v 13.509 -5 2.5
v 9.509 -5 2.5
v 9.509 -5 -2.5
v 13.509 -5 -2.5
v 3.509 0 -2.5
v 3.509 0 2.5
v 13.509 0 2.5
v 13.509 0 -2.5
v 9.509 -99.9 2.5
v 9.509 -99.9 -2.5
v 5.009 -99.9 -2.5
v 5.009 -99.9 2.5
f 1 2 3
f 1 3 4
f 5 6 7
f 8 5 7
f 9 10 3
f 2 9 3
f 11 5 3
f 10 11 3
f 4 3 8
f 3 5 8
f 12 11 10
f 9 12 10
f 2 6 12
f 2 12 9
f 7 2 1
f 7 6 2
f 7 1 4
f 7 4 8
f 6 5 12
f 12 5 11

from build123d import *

# Parameters (mm, degrees)
LOFT3_START         = -2.5
LOFT3_DEPTH         = 5
SKETCH7_W           = 4
SKETCH7_H           = 5
BOSS_EXTRUDE1_DEPTH = 5


# Read off the part's stored shape, not the designer's step: Loft3
with BuildPart() as part:
    # Loft3 outline → Loft3 (new body)
    with BuildSketch(Plane.XY.offset(LOFT3_START)):
        Polygon((5.008763306, -99.9), (9.508763306, -99.9), (9.508763306, 0), (3.508763306, 0), align=None)
    extrude(amount=LOFT3_DEPTH)

    # Sketch7 → Boss-Extrude1 (add)
    with BuildSketch(Plane.XY.offset(2.5)):
        with Locations((11.508763306, -2.5)):
            Rectangle(SKETCH7_W, SKETCH7_H)
    extrude(amount=-BOSS_EXTRUDE1_DEPTH)


solid = part.part
